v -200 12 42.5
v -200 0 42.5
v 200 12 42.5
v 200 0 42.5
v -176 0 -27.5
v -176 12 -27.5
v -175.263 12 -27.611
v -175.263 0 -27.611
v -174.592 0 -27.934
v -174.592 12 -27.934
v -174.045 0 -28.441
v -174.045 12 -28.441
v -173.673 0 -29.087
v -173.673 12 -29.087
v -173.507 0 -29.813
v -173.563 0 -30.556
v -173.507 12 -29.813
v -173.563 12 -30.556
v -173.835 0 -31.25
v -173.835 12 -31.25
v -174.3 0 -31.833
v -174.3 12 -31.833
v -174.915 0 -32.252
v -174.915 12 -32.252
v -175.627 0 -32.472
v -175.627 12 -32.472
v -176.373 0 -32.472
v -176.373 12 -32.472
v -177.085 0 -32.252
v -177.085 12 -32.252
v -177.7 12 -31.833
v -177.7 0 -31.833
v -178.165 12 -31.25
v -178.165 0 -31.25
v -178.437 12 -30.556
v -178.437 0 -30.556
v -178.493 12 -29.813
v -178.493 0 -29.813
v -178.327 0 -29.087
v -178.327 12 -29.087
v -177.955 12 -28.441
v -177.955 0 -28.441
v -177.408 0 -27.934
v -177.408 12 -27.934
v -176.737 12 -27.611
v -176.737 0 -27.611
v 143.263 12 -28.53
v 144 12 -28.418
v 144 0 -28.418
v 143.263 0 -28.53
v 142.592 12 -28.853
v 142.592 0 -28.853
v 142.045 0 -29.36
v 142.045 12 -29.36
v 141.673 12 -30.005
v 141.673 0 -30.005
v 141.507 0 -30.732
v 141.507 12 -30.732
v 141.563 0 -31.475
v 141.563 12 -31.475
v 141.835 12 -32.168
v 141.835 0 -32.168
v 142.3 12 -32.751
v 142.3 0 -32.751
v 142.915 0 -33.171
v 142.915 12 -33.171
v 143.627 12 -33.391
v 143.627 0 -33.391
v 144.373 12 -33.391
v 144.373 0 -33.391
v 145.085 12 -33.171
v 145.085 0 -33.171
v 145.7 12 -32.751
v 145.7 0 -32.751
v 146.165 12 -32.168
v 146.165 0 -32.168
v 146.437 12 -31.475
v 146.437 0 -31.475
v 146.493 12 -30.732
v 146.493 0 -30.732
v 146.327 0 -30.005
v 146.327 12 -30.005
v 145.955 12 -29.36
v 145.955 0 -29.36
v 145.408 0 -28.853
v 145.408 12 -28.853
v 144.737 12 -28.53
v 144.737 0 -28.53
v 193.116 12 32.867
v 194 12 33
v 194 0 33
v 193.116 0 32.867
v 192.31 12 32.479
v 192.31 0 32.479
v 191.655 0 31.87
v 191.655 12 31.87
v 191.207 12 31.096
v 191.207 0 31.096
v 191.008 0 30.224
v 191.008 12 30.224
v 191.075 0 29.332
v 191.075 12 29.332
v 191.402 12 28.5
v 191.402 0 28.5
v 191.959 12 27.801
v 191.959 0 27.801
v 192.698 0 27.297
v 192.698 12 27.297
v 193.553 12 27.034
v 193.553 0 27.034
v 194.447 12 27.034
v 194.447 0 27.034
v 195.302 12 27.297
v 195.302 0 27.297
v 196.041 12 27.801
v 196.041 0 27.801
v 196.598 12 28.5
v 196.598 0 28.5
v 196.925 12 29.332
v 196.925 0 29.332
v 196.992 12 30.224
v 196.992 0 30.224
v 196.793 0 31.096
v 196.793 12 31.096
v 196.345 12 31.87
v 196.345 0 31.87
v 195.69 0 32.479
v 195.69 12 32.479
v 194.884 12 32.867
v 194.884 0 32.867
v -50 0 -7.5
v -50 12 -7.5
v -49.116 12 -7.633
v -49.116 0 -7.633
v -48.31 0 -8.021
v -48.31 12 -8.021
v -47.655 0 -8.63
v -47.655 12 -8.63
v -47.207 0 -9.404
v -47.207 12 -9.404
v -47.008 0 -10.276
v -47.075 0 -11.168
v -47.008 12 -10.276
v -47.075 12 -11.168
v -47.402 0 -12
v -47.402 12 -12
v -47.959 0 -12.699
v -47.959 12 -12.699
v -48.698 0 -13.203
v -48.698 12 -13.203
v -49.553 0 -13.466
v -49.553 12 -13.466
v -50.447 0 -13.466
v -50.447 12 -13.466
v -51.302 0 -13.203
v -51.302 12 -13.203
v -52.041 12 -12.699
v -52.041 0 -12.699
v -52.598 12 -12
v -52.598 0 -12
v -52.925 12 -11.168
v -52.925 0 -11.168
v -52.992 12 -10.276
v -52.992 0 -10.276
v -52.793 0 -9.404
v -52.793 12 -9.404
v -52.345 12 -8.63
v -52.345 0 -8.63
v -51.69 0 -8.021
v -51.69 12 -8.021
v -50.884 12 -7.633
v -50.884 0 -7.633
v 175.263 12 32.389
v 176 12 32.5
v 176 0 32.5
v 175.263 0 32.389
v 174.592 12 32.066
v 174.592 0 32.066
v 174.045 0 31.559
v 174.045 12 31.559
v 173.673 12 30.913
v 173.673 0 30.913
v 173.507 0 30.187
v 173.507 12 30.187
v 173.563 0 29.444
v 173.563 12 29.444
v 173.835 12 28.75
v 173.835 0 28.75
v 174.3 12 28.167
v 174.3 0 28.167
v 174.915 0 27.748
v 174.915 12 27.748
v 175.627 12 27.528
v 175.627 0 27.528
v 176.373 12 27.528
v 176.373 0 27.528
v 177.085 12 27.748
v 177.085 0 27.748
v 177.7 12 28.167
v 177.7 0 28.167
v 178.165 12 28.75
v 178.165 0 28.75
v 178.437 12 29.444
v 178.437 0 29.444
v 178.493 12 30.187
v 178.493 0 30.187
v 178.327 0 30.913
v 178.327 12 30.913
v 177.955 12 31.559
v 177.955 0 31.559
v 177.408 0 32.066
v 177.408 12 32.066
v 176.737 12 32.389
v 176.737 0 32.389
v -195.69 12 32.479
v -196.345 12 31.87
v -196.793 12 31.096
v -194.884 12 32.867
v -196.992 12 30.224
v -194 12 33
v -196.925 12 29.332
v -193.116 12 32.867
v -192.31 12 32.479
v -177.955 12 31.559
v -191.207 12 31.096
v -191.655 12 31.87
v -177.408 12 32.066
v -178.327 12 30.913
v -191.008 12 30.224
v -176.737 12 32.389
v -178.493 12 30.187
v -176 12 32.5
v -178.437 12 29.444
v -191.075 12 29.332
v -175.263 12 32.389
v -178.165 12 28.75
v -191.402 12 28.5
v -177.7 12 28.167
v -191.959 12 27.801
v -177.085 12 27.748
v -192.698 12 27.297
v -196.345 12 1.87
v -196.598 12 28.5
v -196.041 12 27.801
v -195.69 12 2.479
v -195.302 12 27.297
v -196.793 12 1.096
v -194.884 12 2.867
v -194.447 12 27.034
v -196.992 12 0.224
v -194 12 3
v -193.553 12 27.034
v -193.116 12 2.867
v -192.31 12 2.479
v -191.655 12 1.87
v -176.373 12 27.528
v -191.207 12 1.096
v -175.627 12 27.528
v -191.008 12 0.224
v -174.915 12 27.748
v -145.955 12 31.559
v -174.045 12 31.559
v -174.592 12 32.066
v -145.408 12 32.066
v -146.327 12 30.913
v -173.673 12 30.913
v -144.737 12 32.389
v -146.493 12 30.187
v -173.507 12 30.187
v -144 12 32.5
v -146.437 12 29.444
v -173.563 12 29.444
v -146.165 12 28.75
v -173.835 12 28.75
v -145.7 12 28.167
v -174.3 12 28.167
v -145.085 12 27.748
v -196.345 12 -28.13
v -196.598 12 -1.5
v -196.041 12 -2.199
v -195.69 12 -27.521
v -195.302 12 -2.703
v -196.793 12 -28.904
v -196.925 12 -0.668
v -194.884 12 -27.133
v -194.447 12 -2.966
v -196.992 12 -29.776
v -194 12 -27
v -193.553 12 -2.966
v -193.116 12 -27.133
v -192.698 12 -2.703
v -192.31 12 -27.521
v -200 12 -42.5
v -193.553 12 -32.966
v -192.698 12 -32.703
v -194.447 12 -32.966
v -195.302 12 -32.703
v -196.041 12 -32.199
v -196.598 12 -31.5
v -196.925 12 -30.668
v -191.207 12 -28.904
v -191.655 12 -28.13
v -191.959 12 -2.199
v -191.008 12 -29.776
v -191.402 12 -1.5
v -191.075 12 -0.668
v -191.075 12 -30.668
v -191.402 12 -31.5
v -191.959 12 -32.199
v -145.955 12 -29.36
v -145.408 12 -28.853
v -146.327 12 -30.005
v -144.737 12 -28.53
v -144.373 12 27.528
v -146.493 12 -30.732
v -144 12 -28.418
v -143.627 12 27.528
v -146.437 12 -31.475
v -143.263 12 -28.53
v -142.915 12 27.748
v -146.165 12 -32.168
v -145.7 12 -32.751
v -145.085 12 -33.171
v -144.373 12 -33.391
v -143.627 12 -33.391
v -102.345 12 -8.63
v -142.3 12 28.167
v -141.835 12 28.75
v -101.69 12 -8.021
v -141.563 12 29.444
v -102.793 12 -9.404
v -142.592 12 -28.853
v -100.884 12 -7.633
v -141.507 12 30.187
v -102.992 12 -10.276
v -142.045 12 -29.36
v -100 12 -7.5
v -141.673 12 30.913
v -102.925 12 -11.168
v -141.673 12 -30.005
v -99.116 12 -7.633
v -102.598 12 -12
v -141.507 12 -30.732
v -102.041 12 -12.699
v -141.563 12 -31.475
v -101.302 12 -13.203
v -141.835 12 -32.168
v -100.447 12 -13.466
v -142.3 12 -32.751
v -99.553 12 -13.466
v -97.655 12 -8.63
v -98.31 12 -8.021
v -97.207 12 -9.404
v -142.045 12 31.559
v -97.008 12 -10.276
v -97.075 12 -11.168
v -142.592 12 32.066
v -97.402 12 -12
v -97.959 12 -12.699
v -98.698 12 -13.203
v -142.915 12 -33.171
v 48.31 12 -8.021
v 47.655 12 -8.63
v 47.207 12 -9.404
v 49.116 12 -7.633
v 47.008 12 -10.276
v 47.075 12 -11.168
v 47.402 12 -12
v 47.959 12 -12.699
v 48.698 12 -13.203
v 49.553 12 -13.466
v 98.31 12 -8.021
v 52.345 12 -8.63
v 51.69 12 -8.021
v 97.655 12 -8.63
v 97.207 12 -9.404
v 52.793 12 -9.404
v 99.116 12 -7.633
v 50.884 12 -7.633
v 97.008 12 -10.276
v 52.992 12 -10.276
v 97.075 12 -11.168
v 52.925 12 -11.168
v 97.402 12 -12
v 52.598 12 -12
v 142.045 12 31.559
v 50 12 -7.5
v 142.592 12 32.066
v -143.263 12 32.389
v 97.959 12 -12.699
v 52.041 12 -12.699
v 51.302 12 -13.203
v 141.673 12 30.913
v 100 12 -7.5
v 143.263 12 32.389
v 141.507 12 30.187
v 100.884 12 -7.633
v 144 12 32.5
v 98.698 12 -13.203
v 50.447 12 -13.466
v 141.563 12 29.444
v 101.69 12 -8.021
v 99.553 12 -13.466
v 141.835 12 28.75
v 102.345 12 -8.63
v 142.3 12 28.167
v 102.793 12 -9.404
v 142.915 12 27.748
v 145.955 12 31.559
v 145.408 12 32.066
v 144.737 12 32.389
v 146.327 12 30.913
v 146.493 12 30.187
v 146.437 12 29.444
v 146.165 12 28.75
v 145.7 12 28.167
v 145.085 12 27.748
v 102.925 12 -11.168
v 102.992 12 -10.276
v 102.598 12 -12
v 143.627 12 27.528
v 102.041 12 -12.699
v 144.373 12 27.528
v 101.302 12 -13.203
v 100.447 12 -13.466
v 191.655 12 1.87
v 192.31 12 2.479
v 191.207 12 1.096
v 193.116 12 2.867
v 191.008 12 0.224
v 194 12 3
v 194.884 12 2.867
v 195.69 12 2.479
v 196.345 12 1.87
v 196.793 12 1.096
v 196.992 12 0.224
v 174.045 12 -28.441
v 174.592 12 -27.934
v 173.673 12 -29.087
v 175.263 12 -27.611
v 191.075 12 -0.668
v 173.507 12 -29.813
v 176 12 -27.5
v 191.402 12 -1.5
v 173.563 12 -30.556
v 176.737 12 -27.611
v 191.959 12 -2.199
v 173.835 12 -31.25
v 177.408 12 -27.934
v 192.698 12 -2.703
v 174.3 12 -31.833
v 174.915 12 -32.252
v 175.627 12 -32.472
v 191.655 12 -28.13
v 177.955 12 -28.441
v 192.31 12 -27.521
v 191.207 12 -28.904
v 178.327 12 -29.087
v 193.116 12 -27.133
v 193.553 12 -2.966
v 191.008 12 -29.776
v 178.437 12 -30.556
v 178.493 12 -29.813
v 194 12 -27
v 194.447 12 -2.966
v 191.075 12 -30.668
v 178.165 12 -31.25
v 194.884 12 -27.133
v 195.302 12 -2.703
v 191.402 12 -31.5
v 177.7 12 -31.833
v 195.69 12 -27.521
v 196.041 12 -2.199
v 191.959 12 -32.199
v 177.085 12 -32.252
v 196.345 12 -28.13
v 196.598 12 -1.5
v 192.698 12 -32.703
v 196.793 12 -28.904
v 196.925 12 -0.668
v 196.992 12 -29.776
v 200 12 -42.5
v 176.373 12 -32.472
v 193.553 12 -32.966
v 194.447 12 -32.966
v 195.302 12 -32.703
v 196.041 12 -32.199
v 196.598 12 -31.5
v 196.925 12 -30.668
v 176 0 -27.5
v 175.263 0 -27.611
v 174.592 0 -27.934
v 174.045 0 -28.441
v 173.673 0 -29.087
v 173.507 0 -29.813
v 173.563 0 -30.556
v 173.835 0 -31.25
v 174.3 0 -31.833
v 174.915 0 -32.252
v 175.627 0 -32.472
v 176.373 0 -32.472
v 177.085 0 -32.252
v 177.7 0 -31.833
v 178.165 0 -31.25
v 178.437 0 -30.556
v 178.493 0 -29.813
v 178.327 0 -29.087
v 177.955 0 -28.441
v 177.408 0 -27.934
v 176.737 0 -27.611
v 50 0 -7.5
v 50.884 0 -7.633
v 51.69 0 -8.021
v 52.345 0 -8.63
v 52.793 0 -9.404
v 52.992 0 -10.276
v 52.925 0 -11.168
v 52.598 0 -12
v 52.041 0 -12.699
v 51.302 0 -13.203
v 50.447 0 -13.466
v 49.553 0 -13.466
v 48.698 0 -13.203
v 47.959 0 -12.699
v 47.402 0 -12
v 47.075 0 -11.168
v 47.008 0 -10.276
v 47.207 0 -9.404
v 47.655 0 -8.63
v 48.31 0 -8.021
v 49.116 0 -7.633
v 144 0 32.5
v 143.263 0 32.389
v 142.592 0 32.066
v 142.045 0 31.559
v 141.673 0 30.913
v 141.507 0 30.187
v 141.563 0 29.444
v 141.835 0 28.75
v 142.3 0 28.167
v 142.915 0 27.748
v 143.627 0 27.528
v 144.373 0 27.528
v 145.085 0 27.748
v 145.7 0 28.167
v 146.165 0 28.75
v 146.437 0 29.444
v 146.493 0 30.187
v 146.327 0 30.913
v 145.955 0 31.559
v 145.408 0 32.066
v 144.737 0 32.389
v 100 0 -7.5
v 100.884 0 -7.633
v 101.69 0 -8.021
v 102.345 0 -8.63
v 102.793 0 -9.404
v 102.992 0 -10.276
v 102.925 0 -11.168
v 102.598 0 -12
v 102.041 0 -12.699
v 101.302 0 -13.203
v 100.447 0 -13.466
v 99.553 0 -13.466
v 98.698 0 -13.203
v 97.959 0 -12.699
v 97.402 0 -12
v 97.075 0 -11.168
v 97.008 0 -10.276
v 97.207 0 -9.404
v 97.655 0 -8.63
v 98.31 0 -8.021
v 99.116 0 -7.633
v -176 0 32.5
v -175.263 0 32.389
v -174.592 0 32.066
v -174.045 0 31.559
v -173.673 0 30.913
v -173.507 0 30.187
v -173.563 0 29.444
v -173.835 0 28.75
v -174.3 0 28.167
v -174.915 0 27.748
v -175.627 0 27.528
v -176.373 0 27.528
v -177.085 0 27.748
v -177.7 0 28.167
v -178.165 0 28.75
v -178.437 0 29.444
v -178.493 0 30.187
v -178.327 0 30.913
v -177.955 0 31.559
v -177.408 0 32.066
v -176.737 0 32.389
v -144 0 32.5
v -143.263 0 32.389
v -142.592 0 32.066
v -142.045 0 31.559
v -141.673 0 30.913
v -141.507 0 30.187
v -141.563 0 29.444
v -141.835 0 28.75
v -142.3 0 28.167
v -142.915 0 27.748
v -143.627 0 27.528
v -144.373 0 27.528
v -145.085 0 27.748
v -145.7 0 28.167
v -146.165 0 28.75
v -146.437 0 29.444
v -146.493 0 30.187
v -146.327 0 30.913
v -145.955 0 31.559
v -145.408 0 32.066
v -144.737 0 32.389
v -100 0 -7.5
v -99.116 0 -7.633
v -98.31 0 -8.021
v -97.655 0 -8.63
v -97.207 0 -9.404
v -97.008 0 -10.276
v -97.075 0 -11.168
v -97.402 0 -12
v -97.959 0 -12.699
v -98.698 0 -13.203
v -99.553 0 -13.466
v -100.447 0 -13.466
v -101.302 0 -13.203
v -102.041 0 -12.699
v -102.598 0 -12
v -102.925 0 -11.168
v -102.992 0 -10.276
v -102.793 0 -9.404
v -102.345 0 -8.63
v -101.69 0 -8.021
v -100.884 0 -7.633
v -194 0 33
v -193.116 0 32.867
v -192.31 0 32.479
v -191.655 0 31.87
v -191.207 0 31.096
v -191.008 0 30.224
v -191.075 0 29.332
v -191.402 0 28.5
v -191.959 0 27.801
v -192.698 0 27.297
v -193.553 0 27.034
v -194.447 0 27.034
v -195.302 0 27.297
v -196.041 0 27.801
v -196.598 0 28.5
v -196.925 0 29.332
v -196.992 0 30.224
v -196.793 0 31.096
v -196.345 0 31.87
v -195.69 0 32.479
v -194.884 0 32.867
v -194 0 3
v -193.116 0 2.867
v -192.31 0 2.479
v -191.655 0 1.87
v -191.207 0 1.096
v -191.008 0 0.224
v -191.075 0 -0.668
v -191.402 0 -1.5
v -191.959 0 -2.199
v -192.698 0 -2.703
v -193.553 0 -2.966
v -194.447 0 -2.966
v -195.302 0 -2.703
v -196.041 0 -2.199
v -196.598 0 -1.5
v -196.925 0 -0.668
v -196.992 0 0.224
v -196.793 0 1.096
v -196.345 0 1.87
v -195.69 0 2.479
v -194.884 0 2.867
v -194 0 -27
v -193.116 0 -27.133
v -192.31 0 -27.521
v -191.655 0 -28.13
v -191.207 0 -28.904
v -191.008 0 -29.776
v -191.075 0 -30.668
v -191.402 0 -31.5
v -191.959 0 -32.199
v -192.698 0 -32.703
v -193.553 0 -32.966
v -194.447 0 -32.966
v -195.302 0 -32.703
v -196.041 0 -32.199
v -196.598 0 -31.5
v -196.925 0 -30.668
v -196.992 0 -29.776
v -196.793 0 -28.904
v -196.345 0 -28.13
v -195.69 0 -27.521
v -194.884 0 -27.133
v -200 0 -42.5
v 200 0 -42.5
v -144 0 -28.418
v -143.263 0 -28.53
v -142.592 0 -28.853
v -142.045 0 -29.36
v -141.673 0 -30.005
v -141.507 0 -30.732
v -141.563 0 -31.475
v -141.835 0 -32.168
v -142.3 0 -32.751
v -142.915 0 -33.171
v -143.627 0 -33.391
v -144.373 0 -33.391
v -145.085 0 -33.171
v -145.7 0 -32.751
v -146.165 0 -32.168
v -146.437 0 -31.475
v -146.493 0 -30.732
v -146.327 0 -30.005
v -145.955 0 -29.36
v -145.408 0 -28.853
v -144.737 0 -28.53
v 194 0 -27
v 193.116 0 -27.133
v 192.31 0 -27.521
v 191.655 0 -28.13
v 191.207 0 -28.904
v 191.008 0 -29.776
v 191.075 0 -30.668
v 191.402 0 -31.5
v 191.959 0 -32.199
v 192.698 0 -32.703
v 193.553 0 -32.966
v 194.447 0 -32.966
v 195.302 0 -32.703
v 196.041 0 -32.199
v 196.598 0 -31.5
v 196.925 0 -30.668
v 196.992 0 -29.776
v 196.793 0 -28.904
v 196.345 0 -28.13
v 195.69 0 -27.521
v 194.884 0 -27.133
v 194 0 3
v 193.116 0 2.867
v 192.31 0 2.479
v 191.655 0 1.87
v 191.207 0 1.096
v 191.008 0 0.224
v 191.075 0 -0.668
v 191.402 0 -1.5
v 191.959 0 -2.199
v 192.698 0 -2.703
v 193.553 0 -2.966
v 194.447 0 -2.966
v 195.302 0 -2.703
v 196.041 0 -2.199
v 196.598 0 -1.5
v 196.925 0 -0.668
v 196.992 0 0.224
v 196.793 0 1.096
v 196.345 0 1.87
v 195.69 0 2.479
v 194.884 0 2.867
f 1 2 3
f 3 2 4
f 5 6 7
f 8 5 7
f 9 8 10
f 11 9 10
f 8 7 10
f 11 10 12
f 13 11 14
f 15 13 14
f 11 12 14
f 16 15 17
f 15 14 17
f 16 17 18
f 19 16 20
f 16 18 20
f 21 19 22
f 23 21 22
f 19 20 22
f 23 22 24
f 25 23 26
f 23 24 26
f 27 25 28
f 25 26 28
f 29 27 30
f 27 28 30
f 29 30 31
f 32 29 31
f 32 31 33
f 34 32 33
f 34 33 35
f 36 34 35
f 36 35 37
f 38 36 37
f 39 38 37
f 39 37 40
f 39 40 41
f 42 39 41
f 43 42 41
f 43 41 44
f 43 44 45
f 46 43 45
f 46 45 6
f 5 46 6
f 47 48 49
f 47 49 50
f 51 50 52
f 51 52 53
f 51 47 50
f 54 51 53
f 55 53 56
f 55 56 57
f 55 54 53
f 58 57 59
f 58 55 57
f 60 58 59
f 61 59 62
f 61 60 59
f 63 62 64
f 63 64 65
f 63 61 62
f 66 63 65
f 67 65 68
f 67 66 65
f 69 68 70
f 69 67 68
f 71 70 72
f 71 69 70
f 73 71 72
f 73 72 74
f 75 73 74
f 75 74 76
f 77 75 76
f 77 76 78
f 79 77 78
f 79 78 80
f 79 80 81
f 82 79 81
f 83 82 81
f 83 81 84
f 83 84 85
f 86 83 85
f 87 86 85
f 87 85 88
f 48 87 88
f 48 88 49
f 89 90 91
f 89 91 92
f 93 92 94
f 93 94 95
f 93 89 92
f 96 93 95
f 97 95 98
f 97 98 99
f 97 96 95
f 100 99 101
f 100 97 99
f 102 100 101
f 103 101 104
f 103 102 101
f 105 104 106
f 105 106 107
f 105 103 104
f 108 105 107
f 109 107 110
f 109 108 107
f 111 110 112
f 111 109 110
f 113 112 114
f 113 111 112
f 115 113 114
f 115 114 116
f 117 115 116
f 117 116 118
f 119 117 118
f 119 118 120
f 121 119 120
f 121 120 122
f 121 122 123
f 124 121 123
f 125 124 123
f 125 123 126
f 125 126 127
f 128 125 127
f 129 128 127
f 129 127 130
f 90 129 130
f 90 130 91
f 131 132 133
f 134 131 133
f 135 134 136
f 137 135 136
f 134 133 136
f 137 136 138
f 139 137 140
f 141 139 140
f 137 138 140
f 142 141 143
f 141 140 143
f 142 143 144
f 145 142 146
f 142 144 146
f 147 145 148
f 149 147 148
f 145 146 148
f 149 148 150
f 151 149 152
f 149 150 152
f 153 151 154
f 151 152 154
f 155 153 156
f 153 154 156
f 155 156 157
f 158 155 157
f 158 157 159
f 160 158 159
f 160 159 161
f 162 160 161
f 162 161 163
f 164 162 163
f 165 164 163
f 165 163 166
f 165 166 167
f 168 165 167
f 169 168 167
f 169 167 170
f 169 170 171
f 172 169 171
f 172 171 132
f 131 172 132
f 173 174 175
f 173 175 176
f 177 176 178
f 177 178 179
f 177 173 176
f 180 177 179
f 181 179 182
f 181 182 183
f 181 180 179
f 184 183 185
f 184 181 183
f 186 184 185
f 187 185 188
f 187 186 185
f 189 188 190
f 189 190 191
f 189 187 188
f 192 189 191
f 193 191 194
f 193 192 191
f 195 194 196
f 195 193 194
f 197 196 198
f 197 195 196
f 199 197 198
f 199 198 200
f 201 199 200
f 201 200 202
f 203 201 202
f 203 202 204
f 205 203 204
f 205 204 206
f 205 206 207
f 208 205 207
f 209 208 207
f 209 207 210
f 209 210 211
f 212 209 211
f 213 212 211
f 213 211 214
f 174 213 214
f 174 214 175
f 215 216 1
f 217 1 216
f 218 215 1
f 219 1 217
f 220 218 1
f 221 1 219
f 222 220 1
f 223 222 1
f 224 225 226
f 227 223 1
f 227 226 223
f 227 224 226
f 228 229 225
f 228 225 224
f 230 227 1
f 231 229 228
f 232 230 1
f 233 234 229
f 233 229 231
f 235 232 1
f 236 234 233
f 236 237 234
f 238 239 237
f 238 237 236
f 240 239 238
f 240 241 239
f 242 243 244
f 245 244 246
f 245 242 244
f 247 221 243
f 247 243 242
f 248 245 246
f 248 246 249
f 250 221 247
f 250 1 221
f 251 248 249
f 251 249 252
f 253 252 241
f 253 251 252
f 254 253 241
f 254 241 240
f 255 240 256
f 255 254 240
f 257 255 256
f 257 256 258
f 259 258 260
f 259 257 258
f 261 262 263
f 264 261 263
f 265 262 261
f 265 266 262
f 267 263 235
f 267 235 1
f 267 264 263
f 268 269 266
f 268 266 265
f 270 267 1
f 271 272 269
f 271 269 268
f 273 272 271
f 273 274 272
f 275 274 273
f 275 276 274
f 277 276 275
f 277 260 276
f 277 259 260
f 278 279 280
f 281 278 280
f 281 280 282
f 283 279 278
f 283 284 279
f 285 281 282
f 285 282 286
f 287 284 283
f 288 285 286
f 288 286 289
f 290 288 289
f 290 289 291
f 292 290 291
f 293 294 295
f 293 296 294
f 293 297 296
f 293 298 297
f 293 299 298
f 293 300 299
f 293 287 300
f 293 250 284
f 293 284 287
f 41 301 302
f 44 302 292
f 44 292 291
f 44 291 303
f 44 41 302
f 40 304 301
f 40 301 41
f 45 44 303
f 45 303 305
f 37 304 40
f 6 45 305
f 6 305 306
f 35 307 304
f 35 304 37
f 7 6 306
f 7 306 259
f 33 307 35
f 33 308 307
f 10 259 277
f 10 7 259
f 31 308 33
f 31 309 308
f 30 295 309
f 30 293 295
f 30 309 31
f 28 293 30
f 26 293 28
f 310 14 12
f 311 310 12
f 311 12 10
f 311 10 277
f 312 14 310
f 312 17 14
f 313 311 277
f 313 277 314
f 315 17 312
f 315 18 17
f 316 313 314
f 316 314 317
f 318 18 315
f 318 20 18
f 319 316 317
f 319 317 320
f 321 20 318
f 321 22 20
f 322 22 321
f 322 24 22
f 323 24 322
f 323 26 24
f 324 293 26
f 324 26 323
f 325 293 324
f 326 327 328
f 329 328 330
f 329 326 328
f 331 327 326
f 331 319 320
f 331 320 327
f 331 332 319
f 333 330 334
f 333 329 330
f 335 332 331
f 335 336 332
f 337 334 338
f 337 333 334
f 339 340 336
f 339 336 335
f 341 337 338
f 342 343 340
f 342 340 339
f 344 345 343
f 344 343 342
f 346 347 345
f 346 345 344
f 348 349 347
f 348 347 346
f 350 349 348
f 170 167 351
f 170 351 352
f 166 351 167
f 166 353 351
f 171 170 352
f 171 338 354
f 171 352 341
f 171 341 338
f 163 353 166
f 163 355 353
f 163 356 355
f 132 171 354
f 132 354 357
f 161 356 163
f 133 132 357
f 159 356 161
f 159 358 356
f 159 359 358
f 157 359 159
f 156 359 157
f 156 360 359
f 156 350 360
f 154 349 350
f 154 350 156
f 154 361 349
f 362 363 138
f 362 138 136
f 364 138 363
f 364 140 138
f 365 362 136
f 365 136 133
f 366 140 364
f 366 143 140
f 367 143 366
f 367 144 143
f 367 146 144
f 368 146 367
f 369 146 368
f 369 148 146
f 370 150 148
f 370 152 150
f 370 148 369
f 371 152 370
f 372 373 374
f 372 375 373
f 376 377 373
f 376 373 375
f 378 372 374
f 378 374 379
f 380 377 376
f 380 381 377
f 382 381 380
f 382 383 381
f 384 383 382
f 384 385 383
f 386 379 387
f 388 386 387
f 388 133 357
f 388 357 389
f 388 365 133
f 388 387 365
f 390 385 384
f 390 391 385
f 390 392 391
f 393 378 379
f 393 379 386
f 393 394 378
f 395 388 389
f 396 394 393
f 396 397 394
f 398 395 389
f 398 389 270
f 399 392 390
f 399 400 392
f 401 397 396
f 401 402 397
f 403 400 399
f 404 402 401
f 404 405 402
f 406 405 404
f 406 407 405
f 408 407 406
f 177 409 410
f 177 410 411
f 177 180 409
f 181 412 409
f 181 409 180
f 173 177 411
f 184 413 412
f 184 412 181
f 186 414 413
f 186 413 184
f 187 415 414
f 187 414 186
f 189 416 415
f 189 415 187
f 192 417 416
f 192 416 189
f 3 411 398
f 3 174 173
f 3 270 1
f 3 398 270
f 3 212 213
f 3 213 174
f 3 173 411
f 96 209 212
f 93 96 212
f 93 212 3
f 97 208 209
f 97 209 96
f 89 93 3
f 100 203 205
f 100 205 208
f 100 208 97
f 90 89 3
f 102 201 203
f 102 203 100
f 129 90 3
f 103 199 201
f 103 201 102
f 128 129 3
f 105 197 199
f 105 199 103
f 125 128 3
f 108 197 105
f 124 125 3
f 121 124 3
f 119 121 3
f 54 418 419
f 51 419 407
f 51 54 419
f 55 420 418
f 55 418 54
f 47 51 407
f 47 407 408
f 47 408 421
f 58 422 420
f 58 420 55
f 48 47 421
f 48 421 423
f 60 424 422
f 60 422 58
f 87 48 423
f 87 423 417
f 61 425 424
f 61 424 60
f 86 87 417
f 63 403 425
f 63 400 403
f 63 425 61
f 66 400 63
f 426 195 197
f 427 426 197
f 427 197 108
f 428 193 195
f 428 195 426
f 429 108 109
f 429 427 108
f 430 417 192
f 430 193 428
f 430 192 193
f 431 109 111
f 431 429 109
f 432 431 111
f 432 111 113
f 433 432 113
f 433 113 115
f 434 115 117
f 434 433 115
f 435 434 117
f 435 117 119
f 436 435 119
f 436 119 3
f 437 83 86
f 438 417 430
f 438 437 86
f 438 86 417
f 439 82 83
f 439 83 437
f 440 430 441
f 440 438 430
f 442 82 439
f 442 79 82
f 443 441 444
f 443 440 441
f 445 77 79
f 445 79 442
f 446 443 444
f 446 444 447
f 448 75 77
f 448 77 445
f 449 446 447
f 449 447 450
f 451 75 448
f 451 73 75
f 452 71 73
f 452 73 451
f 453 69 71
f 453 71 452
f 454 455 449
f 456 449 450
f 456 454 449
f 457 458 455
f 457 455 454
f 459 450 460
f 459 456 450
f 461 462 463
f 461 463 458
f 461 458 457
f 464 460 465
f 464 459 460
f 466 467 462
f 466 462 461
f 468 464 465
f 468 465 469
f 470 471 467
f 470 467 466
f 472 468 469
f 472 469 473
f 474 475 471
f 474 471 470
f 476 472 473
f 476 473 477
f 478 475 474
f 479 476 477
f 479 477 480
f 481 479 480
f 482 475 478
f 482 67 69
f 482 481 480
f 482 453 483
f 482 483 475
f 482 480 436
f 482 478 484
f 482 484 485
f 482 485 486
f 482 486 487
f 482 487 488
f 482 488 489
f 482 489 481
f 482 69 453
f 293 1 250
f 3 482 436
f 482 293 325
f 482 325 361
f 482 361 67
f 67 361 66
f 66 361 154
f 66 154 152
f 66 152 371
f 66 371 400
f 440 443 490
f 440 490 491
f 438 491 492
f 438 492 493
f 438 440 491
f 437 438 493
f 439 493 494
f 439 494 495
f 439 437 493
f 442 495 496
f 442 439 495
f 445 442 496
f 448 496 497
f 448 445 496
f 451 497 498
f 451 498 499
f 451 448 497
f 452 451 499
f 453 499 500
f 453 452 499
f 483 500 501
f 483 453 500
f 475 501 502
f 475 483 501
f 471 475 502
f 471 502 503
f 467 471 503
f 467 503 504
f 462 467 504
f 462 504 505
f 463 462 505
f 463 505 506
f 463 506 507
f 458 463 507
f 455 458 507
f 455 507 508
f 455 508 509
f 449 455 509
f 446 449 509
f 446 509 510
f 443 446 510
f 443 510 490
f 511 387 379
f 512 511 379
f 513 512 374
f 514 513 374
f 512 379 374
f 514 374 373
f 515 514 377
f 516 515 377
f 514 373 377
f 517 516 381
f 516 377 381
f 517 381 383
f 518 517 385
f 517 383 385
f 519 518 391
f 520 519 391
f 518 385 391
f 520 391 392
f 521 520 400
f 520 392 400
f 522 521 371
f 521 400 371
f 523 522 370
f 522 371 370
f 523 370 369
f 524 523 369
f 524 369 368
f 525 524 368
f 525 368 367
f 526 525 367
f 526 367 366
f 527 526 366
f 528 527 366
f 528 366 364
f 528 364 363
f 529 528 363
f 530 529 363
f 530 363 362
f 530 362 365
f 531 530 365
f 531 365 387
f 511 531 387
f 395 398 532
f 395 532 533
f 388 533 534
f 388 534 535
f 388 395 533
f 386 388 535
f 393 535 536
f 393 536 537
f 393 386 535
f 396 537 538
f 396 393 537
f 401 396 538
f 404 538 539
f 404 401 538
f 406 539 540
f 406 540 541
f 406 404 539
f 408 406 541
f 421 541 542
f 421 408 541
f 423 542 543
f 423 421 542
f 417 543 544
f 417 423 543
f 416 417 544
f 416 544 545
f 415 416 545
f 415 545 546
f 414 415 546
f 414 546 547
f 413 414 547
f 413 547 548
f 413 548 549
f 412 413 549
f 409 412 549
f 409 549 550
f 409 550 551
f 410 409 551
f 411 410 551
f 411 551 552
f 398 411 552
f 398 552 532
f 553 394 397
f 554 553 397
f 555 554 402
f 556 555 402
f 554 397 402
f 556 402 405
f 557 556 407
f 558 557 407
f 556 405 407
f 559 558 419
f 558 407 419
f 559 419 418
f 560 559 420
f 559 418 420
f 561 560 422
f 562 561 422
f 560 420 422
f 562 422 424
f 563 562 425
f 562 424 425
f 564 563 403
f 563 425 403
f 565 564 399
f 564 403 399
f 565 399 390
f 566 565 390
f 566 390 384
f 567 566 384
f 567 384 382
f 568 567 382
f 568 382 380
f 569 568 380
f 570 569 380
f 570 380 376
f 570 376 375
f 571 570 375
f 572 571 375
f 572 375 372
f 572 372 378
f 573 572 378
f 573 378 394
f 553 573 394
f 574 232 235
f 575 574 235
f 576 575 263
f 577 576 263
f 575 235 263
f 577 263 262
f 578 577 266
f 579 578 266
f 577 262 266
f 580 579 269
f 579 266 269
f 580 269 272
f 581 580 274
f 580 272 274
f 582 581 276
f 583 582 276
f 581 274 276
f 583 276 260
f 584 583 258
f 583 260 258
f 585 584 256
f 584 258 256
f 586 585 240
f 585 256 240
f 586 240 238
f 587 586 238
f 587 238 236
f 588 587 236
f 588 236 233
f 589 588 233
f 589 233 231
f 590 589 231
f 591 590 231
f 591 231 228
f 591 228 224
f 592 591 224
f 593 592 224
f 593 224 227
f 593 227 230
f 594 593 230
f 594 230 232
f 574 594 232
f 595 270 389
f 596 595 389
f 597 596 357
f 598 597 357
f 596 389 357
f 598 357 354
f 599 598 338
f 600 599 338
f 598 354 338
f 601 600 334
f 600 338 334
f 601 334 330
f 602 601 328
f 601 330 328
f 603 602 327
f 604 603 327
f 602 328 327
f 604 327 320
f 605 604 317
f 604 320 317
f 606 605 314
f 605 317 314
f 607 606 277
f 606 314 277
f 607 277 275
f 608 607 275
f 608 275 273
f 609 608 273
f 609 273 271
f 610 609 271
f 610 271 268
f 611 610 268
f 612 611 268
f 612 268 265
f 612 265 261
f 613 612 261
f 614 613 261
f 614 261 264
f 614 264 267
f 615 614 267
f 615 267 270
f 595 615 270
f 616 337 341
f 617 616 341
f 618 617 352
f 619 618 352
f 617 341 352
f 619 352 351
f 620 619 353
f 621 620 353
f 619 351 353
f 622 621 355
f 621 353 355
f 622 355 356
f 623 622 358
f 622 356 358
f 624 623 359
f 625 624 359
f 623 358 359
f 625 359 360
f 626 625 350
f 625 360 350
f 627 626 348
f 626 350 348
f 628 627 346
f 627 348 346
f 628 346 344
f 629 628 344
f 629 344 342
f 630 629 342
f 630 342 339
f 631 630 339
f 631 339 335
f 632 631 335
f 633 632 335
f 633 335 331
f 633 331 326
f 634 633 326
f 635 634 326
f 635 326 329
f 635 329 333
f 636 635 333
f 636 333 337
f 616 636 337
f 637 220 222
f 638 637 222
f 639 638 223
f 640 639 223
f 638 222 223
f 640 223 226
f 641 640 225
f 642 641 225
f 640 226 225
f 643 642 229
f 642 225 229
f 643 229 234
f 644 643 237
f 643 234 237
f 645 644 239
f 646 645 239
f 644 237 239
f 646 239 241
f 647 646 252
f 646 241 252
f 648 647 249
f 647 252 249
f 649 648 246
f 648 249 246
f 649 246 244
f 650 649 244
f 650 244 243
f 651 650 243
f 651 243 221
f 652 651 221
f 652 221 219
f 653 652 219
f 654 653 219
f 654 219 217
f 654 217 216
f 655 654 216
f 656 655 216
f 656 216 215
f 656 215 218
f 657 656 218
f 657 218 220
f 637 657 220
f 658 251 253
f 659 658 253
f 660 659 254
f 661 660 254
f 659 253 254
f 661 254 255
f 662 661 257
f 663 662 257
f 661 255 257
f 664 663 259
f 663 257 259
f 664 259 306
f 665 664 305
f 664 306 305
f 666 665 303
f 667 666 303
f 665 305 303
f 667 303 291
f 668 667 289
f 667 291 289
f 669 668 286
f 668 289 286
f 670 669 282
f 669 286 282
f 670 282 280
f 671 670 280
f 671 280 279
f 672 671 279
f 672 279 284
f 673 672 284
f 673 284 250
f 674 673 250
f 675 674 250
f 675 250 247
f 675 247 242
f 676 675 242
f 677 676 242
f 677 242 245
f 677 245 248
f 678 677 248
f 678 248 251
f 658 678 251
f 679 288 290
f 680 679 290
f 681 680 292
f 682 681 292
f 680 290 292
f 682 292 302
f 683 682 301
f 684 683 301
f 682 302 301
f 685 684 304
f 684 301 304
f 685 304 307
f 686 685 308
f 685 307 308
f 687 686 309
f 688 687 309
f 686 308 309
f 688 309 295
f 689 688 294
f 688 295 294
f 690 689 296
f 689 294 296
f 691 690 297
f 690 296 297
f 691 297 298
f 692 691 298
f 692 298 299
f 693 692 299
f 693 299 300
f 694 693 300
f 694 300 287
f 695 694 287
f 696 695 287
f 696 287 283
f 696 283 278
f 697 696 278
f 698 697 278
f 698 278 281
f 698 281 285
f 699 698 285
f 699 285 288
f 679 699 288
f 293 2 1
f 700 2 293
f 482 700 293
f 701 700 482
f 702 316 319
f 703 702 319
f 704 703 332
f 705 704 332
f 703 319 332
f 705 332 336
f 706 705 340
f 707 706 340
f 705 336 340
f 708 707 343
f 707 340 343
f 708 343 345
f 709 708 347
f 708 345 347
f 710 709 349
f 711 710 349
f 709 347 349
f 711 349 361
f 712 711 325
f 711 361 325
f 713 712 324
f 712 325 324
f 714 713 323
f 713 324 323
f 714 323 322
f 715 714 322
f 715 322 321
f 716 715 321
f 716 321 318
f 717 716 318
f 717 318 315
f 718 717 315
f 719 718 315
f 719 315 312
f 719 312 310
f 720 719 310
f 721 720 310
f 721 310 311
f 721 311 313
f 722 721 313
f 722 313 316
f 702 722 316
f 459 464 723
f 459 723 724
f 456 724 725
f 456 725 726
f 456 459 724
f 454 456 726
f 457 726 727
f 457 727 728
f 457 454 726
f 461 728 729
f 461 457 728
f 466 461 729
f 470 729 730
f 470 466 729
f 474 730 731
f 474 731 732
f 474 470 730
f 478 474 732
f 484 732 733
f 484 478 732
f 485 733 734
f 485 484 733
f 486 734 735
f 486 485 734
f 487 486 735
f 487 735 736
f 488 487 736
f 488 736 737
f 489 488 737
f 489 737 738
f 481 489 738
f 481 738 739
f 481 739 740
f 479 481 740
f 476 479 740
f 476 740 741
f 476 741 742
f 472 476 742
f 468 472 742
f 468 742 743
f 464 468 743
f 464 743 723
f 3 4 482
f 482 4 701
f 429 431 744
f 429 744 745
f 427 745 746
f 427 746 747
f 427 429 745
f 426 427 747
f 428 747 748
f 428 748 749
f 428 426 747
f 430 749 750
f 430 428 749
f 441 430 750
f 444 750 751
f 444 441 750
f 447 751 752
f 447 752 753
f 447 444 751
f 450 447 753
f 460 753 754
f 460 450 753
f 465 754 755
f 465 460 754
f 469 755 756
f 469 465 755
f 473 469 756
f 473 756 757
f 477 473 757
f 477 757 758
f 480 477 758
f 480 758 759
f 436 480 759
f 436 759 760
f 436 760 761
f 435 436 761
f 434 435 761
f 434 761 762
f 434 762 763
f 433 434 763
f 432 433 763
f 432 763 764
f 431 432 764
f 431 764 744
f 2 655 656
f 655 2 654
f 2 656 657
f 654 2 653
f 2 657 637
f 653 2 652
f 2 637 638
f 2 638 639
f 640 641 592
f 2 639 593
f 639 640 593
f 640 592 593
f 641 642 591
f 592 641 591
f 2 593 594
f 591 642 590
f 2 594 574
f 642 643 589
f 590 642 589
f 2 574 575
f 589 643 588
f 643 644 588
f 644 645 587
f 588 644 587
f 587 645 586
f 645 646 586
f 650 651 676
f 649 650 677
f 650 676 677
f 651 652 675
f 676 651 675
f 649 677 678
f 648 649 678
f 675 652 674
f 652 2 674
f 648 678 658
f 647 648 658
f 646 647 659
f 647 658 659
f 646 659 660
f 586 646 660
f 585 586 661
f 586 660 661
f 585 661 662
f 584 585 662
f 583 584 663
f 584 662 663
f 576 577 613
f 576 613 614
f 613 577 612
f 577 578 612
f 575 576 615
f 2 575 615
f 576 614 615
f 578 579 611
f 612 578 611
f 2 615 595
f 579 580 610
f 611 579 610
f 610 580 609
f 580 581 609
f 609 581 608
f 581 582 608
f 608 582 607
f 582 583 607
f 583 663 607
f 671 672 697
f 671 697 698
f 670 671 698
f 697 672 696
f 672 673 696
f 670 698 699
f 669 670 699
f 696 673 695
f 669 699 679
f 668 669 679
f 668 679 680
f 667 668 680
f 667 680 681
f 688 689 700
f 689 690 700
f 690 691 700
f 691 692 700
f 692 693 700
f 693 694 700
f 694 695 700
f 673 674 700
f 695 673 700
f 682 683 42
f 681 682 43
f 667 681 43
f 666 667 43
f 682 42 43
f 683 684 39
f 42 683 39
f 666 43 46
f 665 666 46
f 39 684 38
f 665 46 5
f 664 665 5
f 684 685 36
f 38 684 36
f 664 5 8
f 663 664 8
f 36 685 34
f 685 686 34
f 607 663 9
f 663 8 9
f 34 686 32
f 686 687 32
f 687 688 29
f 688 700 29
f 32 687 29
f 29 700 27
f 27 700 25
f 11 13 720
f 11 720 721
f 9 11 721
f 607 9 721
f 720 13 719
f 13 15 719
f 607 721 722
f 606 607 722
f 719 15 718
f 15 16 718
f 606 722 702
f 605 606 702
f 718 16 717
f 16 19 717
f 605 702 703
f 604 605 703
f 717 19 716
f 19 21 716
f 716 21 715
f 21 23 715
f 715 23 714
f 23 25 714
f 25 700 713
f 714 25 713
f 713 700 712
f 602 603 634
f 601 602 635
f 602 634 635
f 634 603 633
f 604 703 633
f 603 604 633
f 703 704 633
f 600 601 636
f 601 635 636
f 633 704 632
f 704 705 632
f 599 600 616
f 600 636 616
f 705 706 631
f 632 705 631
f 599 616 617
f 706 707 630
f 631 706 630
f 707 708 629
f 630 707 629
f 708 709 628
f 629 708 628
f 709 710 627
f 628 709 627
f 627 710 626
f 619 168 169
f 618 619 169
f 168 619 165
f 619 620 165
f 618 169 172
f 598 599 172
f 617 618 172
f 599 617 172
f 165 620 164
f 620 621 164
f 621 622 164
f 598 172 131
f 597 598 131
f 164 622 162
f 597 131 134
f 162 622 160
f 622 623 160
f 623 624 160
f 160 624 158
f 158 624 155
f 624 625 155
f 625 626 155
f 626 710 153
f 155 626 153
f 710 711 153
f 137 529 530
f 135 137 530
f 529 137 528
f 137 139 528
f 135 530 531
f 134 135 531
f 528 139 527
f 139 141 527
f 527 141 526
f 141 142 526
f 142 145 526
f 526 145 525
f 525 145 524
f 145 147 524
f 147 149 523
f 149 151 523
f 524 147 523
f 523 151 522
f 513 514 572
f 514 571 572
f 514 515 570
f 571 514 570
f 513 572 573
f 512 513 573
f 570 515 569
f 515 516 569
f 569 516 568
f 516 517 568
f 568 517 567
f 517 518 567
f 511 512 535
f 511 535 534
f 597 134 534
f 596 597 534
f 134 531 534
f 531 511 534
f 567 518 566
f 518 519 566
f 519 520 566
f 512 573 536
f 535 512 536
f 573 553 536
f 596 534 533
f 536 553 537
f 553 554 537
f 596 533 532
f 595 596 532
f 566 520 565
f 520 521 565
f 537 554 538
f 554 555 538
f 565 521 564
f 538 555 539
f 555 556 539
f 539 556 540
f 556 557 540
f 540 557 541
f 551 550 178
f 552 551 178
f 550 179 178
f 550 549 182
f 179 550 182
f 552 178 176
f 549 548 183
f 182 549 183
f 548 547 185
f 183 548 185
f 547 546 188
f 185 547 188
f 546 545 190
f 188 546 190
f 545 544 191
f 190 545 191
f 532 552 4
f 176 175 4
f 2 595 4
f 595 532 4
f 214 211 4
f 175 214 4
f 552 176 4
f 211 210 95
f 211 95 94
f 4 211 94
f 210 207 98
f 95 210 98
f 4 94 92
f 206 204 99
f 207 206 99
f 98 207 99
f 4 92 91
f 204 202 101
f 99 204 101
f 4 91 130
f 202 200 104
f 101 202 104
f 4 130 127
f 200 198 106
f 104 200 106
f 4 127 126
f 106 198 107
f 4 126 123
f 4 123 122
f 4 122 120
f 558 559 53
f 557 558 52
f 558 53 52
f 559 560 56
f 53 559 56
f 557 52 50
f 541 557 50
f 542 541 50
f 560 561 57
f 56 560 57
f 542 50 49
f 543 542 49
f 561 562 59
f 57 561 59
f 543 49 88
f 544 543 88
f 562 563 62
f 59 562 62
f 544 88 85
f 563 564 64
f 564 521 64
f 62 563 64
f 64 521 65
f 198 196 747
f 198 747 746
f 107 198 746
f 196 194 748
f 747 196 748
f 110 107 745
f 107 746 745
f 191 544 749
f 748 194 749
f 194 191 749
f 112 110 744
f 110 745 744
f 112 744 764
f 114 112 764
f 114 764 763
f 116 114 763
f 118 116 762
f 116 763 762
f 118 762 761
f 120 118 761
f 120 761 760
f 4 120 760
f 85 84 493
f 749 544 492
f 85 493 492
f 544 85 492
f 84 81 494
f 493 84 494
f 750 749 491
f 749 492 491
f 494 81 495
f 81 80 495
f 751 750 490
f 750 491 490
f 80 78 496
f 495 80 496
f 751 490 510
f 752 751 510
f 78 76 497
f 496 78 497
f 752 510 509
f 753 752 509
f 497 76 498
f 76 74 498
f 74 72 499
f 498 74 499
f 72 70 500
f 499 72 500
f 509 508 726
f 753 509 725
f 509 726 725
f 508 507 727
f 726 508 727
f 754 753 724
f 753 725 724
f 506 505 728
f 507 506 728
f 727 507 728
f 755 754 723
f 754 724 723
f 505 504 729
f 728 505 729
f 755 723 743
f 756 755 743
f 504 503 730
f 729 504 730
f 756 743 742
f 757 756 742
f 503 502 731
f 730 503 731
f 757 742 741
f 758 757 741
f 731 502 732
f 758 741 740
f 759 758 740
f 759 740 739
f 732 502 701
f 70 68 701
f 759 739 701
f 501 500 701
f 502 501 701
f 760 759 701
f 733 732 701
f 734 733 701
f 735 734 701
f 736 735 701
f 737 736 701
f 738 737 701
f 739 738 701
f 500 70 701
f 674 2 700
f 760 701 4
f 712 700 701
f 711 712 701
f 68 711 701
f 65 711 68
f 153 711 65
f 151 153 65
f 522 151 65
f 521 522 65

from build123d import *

# Parameters (mm, degrees)
SKETCH1_W           = 400
SKETCH1_H           = 85
BOSS_EXTRUDE1_DEPTH = 12
CUT_EXTRUDE1_REACH  = 206.818
SKETCH2_R           = 2.5
CUT_EXTRUDE2_REACH  = 206.818
SKETCH3_R           = 3
CUT_EXTRUDE3_REACH  = 206.818
SKETCH4_R           = 3


with BuildPart() as part:
    # Sketch1 → Boss-Extrude1 (new body)
    with BuildSketch(Plane(origin=(0, 0, 0), x_dir=(1, 0, 0), z_dir=(0, 1, 0))):
        Rectangle(SKETCH1_W, SKETCH1_H)
    extrude(amount=BOSS_EXTRUDE1_DEPTH)

    # Sketch2 → Cut-Extrude1 (cut, up to next)
    with BuildSketch(Plane(origin=(0, 12, 0), x_dir=(1, 0, 0), z_dir=(0, 1, 0)), mode=Mode.PRIVATE) as cut_extrude1_sk1:
        with Locations(Location((-176, -30, 0), (0, 0, 270))):
            Circle(SKETCH2_R)
    cut_extrude1_tool1 = extrude(cut_extrude1_sk1.sketch, amount=-CUT_EXTRUDE1_REACH, mode=Mode.PRIVATE) & part.part
    # Sketch2 → Cut-Extrude1 (cut, up to next)
    with BuildSketch(Plane(origin=(0, 12, 0), x_dir=(1, 0, 0), z_dir=(0, 1, 0)), mode=Mode.PRIVATE) as cut_extrude1_sk2:
        with Locations(Location((-144, -30, 0), (0, 0, 270))):
            Circle(SKETCH2_R)
    cut_extrude1_tool2 = extrude(cut_extrude1_sk2.sketch, amount=-CUT_EXTRUDE1_REACH, mode=Mode.PRIVATE) & part.part
    # Sketch2 → Cut-Extrude1 (cut, up to next)
    with BuildSketch(Plane(origin=(0, 12, 0), x_dir=(1, 0, 0), z_dir=(0, 1, 0)), mode=Mode.PRIVATE) as cut_extrude1_sk3:
        with Locations(Location((-144, 30.918491962, 0), (0, 0, 270))):
            Circle(SKETCH2_R)
    cut_extrude1_tool3 = extrude(cut_extrude1_sk3.sketch, amount=-CUT_EXTRUDE1_REACH, mode=Mode.PRIVATE) & part.part
    # Sketch2 → Cut-Extrude1 (cut, up to next)
    with BuildSketch(Plane(origin=(0, 12, 0), x_dir=(1, 0, 0), z_dir=(0, 1, 0)), mode=Mode.PRIVATE) as cut_extrude1_sk4:
        with Locations(Location((-176, 30, 0), (0, 0, 270))):
            Circle(SKETCH2_R)
    cut_extrude1_tool4 = extrude(cut_extrude1_sk4.sketch, amount=-CUT_EXTRUDE1_REACH, mode=Mode.PRIVATE) & part.part
    cut_extrude1_1 = cut_extrude1_tool1.solids().sort_by_distance((-176, 12, 30))[0]
    add(cut_extrude1_1, mode=Mode.SUBTRACT)
    cut_extrude1_2 = cut_extrude1_tool2.solids().sort_by_distance((-144, 12, 30))[0]
    add(cut_extrude1_2, mode=Mode.SUBTRACT)
    cut_extrude1_3 = cut_extrude1_tool3.solids().sort_by_distance((-144, 12, -30.918492))[0]
    add(cut_extrude1_3, mode=Mode.SUBTRACT)
    cut_extrude1_4 = cut_extrude1_tool4.solids().sort_by_distance((-176, 12, -30))[0]
    add(cut_extrude1_4, mode=Mode.SUBTRACT)
    cut_extrude1 = cut_extrude1_1 + cut_extrude1_2 + cut_extrude1_3 + cut_extrude1_4  # Cut-Extrude1 as one shape, for the pattern or mirror that repeats it

    # Mirror1: Cut-Extrude1 across plane
    add(cut_extrude1.mirror(Plane(origin=(0, 0, 0), x_dir=(0, 0, 1), z_dir=(1, 0, 0))), mode=Mode.SUBTRACT)

    # Sketch3 → Cut-Extrude2 (cut, up to next)
    with BuildSketch(Plane(origin=(0, 12, 0), x_dir=(1, 0, 0), z_dir=(0, 1, 0)), mode=Mode.PRIVATE) as cut_extrude2_sk1:
        with Locations(Location((50, 10.5, 0), (0, 0, 270))):
            Circle(SKETCH3_R)
    cut_extrude2_tool1 = extrude(cut_extrude2_sk1.sketch, amount=-CUT_EXTRUDE2_REACH, mode=Mode.PRIVATE) & part.part
    # Sketch3 → Cut-Extrude2 (cut, up to next)
    with BuildSketch(Plane(origin=(0, 12, 0), x_dir=(1, 0, 0), z_dir=(0, 1, 0)), mode=Mode.PRIVATE) as cut_extrude2_sk2:
        with Locations(Location((100, 10.5, 0), (0, 0, 270))):
            Circle(SKETCH3_R)
    cut_extrude2_tool2 = extrude(cut_extrude2_sk2.sketch, amount=-CUT_EXTRUDE2_REACH, mode=Mode.PRIVATE) & part.part
    # Sketch3 → Cut-Extrude2 (cut, up to next)
    with BuildSketch(Plane(origin=(0, 12, 0), x_dir=(1, 0, 0), z_dir=(0, 1, 0)), mode=Mode.PRIVATE) as cut_extrude2_sk3:
        with Locations(Location((-100, 10.5, 0), (0, 0, 270))):
            Circle(SKETCH3_R)
    cut_extrude2_tool3 = extrude(cut_extrude2_sk3.sketch, amount=-CUT_EXTRUDE2_REACH, mode=Mode.PRIVATE) & part.part
    # Sketch3 → Cut-Extrude2 (cut, up to next)
    with BuildSketch(Plane(origin=(0, 12, 0), x_dir=(1, 0, 0), z_dir=(0, 1, 0)), mode=Mode.PRIVATE) as cut_extrude2_sk4:
        with Locations(Location((-50, 10.5, 0), (0, 0, 270))):
            Circle(SKETCH3_R)
    cut_extrude2_tool4 = extrude(cut_extrude2_sk4.sketch, amount=-CUT_EXTRUDE2_REACH, mode=Mode.PRIVATE) & part.part
    add(cut_extrude2_tool1.solids().sort_by_distance((50, 12, -10.5))[0], mode=Mode.SUBTRACT)
    add(cut_extrude2_tool2.solids().sort_by_distance((100, 12, -10.5))[0], mode=Mode.SUBTRACT)
    add(cut_extrude2_tool3.solids().sort_by_distance((-100, 12, -10.5))[0], mode=Mode.SUBTRACT)
    add(cut_extrude2_tool4.solids().sort_by_distance((-50, 12, -10.5))[0], mode=Mode.SUBTRACT)

    # Sketch4 → Cut-Extrude3 (cut, up to next)
    with BuildSketch(Plane(origin=(0, 12, 0), x_dir=(1, 0, 0), z_dir=(0, 1, 0)), mode=Mode.PRIVATE) as cut_extrude3_sk1:
        with Locations(Location((-194, 0, 0), (0, 0, 270))):
            Circle(SKETCH4_R)
    cut_extrude3_tool1 = extrude(cut_extrude3_sk1.sketch, amount=-CUT_EXTRUDE3_REACH, mode=Mode.PRIVATE) & part.part
    # Sketch4 → Cut-Extrude3 (cut, up to next)
    with BuildSketch(Plane(origin=(0, 12, 0), x_dir=(1, 0, 0), z_dir=(0, 1, 0)), mode=Mode.PRIVATE) as cut_extrude3_sk2:
        with Locations(Location((-194, 30, 0), (0, 0, 270))):
            Circle(SKETCH4_R)
    cut_extrude3_tool2 = extrude(cut_extrude3_sk2.sketch, amount=-CUT_EXTRUDE3_REACH, mode=Mode.PRIVATE) & part.part
    # Sketch4 → Cut-Extrude3 (cut, up to next)
    with BuildSketch(Plane(origin=(0, 12, 0), x_dir=(1, 0, 0), z_dir=(0, 1, 0)), mode=Mode.PRIVATE) as cut_extrude3_sk3:
        with Locations(Location((-194, -30, 0), (0, 0, 270))):
            Circle(SKETCH4_R)
    cut_extrude3_tool3 = extrude(cut_extrude3_sk3.sketch, amount=-CUT_EXTRUDE3_REACH, mode=Mode.PRIVATE) & part.part
    cut_extrude3_1 = cut_extrude3_tool1.solids().sort_by_distance((-194, 12, 0))[0]
    add(cut_extrude3_1, mode=Mode.SUBTRACT)
    cut_extrude3_2 = cut_extrude3_tool2.solids().sort_by_distance((-194, 12, -30))[0]
    add(cut_extrude3_2, mode=Mode.SUBTRACT)
    cut_extrude3_3 = cut_extrude3_tool3.solids().sort_by_distance((-194, 12, 30))[0]
    add(cut_extrude3_3, mode=Mode.SUBTRACT)
    cut_extrude3 = cut_extrude3_1 + cut_extrude3_2 + cut_extrude3_3  # Cut-Extrude3 as one shape, for the pattern or mirror that repeats it

    # Mirror2: Cut-Extrude3 across plane
    add(cut_extrude3.mirror(Plane(origin=(0, 0, 0), x_dir=(0, 0, 1), z_dir=(1, 0, 0))), mode=Mode.SUBTRACT)


solid = part.part
